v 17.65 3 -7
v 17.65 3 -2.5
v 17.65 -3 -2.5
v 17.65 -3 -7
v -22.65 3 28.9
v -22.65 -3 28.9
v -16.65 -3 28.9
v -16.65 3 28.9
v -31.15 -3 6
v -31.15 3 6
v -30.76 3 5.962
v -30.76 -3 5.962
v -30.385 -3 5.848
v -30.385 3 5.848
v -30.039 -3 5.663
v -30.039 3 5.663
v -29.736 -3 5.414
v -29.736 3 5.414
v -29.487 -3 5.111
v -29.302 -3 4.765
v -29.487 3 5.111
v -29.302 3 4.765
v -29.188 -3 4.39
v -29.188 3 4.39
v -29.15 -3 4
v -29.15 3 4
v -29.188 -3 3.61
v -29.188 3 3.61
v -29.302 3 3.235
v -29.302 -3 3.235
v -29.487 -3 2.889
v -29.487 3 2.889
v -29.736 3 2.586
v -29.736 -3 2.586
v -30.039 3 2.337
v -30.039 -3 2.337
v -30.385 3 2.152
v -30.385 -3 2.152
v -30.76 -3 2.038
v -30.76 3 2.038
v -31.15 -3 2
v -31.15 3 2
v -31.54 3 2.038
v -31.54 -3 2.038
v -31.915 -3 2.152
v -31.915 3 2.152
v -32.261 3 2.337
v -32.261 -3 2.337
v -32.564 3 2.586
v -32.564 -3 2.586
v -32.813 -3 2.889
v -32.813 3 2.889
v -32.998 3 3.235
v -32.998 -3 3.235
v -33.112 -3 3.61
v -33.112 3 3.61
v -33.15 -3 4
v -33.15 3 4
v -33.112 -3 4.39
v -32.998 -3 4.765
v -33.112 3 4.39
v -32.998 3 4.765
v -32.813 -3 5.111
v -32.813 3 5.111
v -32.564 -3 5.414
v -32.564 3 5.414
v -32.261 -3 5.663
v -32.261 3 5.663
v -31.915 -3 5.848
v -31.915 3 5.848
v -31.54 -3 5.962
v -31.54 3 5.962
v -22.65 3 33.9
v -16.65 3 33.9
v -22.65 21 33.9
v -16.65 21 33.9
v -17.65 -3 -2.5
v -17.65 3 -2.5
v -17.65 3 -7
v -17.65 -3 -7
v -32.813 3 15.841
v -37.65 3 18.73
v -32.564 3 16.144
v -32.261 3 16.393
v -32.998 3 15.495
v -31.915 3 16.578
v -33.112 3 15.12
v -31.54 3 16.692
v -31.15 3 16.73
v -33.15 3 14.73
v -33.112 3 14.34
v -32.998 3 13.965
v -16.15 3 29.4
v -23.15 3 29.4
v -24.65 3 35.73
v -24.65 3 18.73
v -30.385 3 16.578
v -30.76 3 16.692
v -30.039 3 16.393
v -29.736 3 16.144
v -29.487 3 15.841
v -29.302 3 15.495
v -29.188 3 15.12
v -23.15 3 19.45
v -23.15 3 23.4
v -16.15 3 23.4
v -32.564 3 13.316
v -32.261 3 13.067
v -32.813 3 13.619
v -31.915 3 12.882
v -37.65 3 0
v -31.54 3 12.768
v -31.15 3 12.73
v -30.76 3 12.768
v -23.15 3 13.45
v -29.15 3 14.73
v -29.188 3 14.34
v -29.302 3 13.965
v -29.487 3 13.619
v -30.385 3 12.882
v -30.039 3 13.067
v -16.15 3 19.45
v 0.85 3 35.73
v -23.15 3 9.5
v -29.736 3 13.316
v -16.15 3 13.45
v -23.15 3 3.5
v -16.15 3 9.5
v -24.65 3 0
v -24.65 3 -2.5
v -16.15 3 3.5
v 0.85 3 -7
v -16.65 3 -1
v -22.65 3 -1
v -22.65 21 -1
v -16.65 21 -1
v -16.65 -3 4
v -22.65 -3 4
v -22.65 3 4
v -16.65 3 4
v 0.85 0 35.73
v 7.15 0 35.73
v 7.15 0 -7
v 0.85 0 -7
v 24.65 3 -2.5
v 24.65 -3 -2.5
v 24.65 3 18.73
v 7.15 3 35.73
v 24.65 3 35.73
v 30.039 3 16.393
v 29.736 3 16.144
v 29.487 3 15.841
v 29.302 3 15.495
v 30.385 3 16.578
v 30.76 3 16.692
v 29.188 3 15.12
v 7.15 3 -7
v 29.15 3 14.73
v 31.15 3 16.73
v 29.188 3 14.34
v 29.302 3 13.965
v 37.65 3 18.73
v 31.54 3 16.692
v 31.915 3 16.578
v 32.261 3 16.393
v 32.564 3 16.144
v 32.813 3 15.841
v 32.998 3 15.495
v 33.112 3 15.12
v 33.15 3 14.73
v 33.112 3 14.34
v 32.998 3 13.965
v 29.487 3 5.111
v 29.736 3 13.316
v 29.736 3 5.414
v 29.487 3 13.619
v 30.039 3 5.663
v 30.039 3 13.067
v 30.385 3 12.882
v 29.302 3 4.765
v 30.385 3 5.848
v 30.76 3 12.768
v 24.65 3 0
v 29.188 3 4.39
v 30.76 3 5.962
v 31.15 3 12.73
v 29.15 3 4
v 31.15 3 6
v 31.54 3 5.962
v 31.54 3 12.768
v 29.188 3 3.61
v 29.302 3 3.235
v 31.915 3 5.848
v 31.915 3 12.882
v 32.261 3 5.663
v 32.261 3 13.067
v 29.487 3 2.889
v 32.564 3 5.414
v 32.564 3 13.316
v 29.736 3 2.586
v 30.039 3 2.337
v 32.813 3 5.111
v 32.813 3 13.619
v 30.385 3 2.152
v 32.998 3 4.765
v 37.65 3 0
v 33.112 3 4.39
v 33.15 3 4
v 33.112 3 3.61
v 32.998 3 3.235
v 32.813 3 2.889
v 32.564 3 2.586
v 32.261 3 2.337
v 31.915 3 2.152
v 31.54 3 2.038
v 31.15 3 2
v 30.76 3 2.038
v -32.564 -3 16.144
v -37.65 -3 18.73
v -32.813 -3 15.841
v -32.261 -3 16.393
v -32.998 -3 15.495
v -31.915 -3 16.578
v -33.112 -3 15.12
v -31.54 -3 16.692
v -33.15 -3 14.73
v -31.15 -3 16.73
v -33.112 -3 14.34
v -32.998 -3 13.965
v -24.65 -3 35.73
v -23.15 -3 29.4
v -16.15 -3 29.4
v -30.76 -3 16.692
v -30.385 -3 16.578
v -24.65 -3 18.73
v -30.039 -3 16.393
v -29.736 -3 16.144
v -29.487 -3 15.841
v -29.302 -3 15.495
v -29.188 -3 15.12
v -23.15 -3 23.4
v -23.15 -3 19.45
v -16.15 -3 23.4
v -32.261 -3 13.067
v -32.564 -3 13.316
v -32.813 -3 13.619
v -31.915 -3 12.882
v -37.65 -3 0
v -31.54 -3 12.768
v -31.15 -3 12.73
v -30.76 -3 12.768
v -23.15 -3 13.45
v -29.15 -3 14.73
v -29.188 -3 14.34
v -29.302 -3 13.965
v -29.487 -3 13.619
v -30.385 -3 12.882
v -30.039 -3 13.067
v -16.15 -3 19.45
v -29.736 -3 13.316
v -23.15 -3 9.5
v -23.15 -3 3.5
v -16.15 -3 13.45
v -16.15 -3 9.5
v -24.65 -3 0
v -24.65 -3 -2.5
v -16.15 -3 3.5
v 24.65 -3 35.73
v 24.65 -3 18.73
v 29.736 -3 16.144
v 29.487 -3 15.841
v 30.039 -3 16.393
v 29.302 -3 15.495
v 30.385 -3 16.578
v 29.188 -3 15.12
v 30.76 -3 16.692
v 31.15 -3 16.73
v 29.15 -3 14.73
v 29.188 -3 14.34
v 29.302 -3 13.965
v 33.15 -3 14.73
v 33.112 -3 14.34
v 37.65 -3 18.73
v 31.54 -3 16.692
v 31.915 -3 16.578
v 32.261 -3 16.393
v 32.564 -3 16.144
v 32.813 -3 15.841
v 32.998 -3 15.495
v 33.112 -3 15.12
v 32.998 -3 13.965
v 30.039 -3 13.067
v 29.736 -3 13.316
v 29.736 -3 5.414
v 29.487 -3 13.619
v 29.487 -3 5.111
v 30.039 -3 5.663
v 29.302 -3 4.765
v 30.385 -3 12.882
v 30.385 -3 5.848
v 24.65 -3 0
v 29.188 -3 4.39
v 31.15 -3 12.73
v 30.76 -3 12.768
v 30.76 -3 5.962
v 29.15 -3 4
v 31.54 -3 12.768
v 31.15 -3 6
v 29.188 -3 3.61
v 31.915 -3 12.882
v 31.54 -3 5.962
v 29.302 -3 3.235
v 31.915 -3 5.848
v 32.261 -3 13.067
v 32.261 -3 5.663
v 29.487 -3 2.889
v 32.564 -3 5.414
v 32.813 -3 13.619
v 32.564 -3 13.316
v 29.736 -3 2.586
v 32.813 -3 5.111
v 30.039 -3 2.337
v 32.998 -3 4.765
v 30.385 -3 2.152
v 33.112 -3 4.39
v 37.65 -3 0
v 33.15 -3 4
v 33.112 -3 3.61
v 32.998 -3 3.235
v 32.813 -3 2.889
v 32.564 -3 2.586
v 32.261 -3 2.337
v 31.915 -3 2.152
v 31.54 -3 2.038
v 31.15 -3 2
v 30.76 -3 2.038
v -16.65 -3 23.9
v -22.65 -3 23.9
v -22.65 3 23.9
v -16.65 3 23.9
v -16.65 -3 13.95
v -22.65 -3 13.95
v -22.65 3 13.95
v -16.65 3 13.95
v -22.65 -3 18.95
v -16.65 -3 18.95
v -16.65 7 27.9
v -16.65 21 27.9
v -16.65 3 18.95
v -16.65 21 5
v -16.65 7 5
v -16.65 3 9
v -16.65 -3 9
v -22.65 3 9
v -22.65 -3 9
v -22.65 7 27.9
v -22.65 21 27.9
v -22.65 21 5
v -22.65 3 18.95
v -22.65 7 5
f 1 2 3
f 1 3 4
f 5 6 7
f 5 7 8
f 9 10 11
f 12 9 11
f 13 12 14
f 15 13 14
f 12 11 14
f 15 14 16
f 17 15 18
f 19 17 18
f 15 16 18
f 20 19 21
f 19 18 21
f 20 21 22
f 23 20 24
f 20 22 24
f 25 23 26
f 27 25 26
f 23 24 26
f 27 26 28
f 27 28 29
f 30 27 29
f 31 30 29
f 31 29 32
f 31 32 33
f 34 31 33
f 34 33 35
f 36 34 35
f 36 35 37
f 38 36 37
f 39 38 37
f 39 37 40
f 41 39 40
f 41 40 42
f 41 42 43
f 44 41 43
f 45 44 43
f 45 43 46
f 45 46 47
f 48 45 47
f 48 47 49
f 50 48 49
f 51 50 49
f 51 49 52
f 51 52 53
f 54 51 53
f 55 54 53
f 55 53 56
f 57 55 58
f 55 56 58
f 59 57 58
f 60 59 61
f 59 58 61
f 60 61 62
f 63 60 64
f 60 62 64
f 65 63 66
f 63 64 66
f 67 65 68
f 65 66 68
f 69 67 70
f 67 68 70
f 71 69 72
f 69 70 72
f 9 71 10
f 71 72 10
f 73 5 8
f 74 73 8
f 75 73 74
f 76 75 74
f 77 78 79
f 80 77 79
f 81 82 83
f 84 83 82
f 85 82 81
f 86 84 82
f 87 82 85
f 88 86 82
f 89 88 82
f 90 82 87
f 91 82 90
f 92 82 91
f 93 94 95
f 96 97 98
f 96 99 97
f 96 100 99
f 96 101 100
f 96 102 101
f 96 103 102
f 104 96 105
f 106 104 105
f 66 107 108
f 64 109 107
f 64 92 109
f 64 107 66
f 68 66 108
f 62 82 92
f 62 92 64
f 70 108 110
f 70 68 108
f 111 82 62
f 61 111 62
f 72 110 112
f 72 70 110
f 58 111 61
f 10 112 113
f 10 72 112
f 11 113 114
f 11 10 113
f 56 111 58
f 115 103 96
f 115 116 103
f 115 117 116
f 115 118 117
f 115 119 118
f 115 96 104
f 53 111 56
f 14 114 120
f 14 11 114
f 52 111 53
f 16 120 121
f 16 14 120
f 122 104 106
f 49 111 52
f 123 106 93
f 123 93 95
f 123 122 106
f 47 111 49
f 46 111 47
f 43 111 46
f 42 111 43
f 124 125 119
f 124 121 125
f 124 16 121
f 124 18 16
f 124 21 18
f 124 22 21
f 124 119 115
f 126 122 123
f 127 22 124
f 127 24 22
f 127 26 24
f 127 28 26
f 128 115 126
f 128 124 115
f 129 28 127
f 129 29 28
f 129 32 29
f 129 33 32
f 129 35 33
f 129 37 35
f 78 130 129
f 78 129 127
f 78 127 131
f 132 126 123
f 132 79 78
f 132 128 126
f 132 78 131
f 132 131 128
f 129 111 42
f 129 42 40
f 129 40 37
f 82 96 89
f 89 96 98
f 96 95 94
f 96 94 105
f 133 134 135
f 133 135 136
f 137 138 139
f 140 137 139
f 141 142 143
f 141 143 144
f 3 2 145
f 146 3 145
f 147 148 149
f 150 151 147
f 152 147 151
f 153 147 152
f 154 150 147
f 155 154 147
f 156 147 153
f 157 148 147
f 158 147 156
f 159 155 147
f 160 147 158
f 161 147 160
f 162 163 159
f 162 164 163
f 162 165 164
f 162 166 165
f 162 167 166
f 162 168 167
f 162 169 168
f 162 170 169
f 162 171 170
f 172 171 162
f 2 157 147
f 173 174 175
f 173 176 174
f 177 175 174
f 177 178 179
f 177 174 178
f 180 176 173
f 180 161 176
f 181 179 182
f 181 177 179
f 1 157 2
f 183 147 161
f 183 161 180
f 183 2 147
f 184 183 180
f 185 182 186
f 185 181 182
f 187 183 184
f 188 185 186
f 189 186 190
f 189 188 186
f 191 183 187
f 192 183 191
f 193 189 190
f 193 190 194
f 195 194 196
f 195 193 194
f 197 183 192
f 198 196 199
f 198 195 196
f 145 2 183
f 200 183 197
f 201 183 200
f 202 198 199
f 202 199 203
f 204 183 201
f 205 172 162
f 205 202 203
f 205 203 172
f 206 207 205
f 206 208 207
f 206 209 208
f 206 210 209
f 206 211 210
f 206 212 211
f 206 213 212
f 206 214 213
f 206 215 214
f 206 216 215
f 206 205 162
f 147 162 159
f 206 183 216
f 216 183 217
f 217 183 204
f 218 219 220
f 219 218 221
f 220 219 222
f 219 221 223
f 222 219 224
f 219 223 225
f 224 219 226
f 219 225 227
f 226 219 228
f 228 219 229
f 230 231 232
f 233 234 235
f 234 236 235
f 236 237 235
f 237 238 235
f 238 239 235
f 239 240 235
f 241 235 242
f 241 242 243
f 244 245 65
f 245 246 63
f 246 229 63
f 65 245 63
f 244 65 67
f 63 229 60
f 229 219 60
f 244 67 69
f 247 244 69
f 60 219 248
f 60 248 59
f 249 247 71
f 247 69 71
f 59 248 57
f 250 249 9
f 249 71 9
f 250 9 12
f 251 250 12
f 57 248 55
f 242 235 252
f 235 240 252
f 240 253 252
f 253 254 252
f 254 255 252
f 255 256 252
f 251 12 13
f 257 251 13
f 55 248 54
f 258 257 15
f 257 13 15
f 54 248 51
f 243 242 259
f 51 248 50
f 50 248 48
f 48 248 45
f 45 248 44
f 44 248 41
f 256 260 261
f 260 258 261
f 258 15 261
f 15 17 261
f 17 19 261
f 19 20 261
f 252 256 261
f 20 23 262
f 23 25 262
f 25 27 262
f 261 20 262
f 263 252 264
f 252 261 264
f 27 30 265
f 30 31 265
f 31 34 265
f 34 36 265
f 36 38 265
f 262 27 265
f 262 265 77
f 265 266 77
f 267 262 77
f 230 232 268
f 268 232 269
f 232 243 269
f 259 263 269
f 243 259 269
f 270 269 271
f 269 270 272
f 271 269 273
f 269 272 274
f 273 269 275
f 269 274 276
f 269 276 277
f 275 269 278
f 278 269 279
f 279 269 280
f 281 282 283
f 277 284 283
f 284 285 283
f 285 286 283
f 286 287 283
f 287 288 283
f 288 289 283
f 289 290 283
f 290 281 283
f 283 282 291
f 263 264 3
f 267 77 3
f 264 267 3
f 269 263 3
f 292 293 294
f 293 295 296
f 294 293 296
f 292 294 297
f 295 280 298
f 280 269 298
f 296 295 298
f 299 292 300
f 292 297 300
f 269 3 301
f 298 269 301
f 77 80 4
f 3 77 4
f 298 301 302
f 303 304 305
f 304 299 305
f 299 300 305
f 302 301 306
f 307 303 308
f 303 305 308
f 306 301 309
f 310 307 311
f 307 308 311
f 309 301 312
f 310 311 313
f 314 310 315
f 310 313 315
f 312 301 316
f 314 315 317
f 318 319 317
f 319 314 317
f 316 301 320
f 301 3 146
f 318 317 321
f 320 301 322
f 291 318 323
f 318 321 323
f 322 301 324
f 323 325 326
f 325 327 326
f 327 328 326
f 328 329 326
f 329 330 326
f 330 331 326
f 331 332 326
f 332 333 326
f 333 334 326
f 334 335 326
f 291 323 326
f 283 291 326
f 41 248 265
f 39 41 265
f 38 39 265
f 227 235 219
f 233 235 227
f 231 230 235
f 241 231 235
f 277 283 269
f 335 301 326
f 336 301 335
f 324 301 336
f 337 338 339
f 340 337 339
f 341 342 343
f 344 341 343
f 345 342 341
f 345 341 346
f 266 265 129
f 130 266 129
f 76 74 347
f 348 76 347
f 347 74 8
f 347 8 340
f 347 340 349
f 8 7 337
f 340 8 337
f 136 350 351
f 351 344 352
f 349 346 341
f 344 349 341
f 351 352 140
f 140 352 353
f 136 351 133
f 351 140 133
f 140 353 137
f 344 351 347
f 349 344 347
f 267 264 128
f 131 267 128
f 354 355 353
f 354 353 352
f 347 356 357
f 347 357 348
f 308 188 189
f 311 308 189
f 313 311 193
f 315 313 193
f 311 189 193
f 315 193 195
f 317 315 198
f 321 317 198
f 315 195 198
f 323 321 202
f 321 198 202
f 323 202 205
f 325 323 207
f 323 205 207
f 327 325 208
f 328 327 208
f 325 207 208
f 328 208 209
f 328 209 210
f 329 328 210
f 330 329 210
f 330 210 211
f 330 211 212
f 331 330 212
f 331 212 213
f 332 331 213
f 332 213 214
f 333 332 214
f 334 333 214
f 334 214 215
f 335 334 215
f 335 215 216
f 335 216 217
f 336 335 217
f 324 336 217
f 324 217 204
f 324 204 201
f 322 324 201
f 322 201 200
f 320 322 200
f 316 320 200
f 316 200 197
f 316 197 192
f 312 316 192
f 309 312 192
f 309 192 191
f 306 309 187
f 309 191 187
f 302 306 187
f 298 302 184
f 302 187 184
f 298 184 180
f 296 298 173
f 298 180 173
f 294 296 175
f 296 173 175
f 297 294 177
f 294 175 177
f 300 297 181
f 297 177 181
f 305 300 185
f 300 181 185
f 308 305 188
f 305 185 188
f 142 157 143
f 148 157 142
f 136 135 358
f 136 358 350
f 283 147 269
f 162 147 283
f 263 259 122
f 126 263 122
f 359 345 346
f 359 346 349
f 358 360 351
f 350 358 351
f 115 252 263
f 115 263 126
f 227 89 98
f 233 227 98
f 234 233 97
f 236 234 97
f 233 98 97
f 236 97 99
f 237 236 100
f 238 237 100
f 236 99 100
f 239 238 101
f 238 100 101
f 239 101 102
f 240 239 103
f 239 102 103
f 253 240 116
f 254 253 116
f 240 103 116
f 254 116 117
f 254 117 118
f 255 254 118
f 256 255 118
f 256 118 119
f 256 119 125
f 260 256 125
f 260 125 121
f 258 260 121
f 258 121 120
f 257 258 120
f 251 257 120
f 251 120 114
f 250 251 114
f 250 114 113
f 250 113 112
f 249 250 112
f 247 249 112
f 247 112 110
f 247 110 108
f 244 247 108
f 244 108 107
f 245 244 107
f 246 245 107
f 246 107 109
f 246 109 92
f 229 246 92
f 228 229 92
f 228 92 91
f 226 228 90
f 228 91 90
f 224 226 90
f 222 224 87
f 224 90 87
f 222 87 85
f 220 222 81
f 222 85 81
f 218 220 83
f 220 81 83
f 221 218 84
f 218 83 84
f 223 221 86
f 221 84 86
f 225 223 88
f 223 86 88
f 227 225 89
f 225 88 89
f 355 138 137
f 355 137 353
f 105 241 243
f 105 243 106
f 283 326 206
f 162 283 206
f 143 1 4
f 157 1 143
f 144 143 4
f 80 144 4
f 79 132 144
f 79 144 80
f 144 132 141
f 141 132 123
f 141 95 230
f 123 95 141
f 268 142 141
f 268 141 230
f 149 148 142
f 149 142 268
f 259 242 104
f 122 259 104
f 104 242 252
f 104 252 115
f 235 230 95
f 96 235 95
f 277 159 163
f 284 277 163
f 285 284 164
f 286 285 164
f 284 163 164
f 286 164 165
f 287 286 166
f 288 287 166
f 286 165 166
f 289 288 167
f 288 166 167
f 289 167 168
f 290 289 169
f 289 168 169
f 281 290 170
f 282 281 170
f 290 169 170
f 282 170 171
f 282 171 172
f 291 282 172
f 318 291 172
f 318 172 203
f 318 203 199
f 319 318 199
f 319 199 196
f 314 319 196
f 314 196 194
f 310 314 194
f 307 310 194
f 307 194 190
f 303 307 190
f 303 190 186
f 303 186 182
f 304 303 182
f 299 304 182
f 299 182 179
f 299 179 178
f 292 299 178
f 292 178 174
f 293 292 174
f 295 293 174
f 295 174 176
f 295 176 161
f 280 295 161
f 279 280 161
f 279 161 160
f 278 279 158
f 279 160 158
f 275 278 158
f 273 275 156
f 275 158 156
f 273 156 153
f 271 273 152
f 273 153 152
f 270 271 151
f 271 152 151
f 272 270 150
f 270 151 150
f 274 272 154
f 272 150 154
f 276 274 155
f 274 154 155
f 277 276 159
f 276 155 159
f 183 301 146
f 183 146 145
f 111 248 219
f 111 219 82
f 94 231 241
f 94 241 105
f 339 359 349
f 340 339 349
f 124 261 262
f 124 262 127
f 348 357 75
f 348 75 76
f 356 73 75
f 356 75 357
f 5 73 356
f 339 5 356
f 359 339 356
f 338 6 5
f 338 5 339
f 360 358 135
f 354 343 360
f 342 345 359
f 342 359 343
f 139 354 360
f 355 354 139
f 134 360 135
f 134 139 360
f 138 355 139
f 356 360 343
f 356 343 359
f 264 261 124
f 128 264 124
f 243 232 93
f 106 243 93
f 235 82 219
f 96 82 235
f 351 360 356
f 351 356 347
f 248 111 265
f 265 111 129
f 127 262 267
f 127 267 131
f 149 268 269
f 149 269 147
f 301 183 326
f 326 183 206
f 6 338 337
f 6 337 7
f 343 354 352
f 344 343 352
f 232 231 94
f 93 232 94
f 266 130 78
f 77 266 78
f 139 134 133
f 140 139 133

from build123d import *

# Parameters (mm, degrees)
SKETCH_2_W          = 75.3
SKETCH_2_H          = 6
EXTRUDE_1_DEPTH     = 18.73
SKETCH_3_R          = 2
CUT_EXTRUDE_1_DEPTH = 13.73
SKETCH_4_W          = 49.3
SKETCH_4_H          = 6
EXTRUDE_3_DEPTH     = 17
SKETCH_6_W          = 49.3
SKETCH_6_H          = 6
EXTRUDE_5_DEPTH     = 7
SKETCH_7_W          = 6
SKETCH_7_H          = 6
EXTRUDE_6_DEPTH     = 18
SKETCH_8_W          = 6.3
SKETCH_8_H          = 42.73
CUT_EXTRUDE_2_DEPTH = 3
SKETCH_9_W          = 7
SKETCH_9_H          = 4.5
CUT_EXTRUDE_3_DEPTH = 10
SKETCH_10_W         = 6
SKETCH_10_H         = 22.9
EXTRUDE_7_DEPTH     = 4
OTHER_START         = -22.65
OTHER_1_OUTLINE_W   = 6
OTHER_1_OUTLINE_H   = 5
OTHER_1_DEPTH       = 6
OTHER_START_2       = -23.15
OTHER_1_2_OUTLINE_W = 6
OTHER_1_2_OUTLINE_H = 6
OTHER_1_2_DEPTH     = 7


# Read off the part's stored shape, not the designer's step: Разделить1, Выступы и прорези-Выступ1, Выступы и прорези-Прорезь1
with BuildPart() as part:
    # Эскиз2 → Бобышка-Вытянуть1 (new body)
    with BuildSketch(Plane.XY):
        Rectangle(SKETCH_2_W, SKETCH_2_H)
    extrude(amount=EXTRUDE_1_DEPTH)

    # Эскиз3 → Вырез-Вытянуть1 (cut)
    with BuildSketch(Plane(origin=(0, 3, 0), x_dir=(1, 0, 0), z_dir=(0, 1, 0))):
        with Locations(Location((-31.15, -4, 0), (0, 0, 270))):
            Circle(SKETCH_3_R)
        with Locations(Location((-31.15, -14.73, 0), (0, 0, 270))):
            Circle(SKETCH_3_R)
        with Locations(Location((31.15, -14.73, 0), (0, 0, 270))):
            Circle(SKETCH_3_R)
        with Locations(Location((31.15, -4, 0), (0, 0, 270))):
            Circle(SKETCH_3_R)
    extrude(amount=-CUT_EXTRUDE_1_DEPTH, mode=Mode.SUBTRACT)

    # Эскиз4 → Бобышка-Вытянуть3 (add)
    with BuildSketch(Plane.XY.offset(18.73)):
        Rectangle(SKETCH_4_W, SKETCH_4_H)
    extrude(amount=EXTRUDE_3_DEPTH)

    # Эскиз6 → Бобышка-Вытянуть5 (add)
    with BuildSketch(Plane(origin=(0, 0, 0), x_dir=(-1, 0, 0), z_dir=(0, 0, -1))):
        Rectangle(SKETCH_6_W, SKETCH_6_H)
    extrude(amount=EXTRUDE_5_DEPTH)

    # Эскиз7 → Бобышка-Вытянуть6 (add)
    with BuildSketch(Plane(origin=(0, 3, 0), x_dir=(1, 0, 0), z_dir=(0, 1, 0))):
        with Locations((-19.65, -2)):
            Rectangle(SKETCH_7_W, SKETCH_7_H)
        with Locations((-19.65, -30.9)):
            Rectangle(SKETCH_7_W, SKETCH_7_H)
    extrude(amount=EXTRUDE_6_DEPTH)

    # Эскиз8 → Вырез-Вытянуть2 (cut)
    with BuildSketch(Plane(origin=(0, 3, -43.99), x_dir=(-1, 0, 0), z_dir=(0, 1, 0))):
        with Locations((-4, 58.355)):
            Rectangle(SKETCH_8_W, SKETCH_8_H)
    extrude(amount=-CUT_EXTRUDE_2_DEPTH, mode=Mode.SUBTRACT)

    # Эскиз9 → Вырез-Вытянуть3 (cut)
    with BuildSketch(Plane(origin=(0, 3, 0), x_dir=(1, 0, 0), z_dir=(0, 1, 0))):
        with Locations((-21.15, 4.75)):
            Rectangle(SKETCH_9_W, SKETCH_9_H)
        with Locations((21.15, 4.75)):
            Rectangle(SKETCH_9_W, SKETCH_9_H)
    extrude(amount=-CUT_EXTRUDE_3_DEPTH, mode=Mode.SUBTRACT)

    # Эскиз10 → Бобышка-Вытянуть7 (add)
    with BuildSketch(Plane(origin=(0, 3, 0), x_dir=(1, 0, 0), z_dir=(0, 1, 0))):
        with Locations((-19.65, -16.45)):
            Rectangle(SKETCH_10_W, SKETCH_10_H)
    extrude(amount=EXTRUDE_7_DEPTH)


with BuildPart() as body_2:
    # Split Bodies 1: the piece on the far side of the plane
    add(part.part)
    split(bisect_by=Plane(origin=(0, 3, 0), x_dir=(1, 0, 0), z_dir=(0, 1, 0)), keep=Keep.BOTTOM)

    # Other 1 2 outline → Other 1 2 (cut)
    with BuildSketch(Plane.YZ.offset(OTHER_START_2)):
        with Locations((0, 26.4)):
            Rectangle(OTHER_1_2_OUTLINE_W, OTHER_1_2_OUTLINE_H)
        with Locations((0, 16.45)):
            Rectangle(OTHER_1_2_OUTLINE_W, OTHER_1_2_OUTLINE_H)
        with Locations((0, 6.5)):
            Rectangle(OTHER_1_2_OUTLINE_W, OTHER_1_2_OUTLINE_H)
    extrude(amount=OTHER_1_2_DEPTH, mode=Mode.SUBTRACT)


with BuildPart() as part_1:
    add(part.part)

    # Split Bodies 1
    split(bisect_by=Plane(origin=(0, 3, 0), x_dir=(1, 0, 0), z_dir=(0, 1, 0)), keep=Keep.TOP)

    # Other 1 outline → Other 1 (add)
    with BuildSketch(Plane.YZ.offset(OTHER_START)):
        with Locations((0, 6.5)):
            Rectangle(OTHER_1_OUTLINE_W, OTHER_1_OUTLINE_H)
        with Locations((0, 16.45)):
            Rectangle(OTHER_1_OUTLINE_W, OTHER_1_OUTLINE_H)
        with Locations((0, 26.4)):
            Rectangle(OTHER_1_OUTLINE_W, OTHER_1_OUTLINE_H)
    extrude(amount=OTHER_1_DEPTH)


solid = Compound([body_2.part, part_1.part])
